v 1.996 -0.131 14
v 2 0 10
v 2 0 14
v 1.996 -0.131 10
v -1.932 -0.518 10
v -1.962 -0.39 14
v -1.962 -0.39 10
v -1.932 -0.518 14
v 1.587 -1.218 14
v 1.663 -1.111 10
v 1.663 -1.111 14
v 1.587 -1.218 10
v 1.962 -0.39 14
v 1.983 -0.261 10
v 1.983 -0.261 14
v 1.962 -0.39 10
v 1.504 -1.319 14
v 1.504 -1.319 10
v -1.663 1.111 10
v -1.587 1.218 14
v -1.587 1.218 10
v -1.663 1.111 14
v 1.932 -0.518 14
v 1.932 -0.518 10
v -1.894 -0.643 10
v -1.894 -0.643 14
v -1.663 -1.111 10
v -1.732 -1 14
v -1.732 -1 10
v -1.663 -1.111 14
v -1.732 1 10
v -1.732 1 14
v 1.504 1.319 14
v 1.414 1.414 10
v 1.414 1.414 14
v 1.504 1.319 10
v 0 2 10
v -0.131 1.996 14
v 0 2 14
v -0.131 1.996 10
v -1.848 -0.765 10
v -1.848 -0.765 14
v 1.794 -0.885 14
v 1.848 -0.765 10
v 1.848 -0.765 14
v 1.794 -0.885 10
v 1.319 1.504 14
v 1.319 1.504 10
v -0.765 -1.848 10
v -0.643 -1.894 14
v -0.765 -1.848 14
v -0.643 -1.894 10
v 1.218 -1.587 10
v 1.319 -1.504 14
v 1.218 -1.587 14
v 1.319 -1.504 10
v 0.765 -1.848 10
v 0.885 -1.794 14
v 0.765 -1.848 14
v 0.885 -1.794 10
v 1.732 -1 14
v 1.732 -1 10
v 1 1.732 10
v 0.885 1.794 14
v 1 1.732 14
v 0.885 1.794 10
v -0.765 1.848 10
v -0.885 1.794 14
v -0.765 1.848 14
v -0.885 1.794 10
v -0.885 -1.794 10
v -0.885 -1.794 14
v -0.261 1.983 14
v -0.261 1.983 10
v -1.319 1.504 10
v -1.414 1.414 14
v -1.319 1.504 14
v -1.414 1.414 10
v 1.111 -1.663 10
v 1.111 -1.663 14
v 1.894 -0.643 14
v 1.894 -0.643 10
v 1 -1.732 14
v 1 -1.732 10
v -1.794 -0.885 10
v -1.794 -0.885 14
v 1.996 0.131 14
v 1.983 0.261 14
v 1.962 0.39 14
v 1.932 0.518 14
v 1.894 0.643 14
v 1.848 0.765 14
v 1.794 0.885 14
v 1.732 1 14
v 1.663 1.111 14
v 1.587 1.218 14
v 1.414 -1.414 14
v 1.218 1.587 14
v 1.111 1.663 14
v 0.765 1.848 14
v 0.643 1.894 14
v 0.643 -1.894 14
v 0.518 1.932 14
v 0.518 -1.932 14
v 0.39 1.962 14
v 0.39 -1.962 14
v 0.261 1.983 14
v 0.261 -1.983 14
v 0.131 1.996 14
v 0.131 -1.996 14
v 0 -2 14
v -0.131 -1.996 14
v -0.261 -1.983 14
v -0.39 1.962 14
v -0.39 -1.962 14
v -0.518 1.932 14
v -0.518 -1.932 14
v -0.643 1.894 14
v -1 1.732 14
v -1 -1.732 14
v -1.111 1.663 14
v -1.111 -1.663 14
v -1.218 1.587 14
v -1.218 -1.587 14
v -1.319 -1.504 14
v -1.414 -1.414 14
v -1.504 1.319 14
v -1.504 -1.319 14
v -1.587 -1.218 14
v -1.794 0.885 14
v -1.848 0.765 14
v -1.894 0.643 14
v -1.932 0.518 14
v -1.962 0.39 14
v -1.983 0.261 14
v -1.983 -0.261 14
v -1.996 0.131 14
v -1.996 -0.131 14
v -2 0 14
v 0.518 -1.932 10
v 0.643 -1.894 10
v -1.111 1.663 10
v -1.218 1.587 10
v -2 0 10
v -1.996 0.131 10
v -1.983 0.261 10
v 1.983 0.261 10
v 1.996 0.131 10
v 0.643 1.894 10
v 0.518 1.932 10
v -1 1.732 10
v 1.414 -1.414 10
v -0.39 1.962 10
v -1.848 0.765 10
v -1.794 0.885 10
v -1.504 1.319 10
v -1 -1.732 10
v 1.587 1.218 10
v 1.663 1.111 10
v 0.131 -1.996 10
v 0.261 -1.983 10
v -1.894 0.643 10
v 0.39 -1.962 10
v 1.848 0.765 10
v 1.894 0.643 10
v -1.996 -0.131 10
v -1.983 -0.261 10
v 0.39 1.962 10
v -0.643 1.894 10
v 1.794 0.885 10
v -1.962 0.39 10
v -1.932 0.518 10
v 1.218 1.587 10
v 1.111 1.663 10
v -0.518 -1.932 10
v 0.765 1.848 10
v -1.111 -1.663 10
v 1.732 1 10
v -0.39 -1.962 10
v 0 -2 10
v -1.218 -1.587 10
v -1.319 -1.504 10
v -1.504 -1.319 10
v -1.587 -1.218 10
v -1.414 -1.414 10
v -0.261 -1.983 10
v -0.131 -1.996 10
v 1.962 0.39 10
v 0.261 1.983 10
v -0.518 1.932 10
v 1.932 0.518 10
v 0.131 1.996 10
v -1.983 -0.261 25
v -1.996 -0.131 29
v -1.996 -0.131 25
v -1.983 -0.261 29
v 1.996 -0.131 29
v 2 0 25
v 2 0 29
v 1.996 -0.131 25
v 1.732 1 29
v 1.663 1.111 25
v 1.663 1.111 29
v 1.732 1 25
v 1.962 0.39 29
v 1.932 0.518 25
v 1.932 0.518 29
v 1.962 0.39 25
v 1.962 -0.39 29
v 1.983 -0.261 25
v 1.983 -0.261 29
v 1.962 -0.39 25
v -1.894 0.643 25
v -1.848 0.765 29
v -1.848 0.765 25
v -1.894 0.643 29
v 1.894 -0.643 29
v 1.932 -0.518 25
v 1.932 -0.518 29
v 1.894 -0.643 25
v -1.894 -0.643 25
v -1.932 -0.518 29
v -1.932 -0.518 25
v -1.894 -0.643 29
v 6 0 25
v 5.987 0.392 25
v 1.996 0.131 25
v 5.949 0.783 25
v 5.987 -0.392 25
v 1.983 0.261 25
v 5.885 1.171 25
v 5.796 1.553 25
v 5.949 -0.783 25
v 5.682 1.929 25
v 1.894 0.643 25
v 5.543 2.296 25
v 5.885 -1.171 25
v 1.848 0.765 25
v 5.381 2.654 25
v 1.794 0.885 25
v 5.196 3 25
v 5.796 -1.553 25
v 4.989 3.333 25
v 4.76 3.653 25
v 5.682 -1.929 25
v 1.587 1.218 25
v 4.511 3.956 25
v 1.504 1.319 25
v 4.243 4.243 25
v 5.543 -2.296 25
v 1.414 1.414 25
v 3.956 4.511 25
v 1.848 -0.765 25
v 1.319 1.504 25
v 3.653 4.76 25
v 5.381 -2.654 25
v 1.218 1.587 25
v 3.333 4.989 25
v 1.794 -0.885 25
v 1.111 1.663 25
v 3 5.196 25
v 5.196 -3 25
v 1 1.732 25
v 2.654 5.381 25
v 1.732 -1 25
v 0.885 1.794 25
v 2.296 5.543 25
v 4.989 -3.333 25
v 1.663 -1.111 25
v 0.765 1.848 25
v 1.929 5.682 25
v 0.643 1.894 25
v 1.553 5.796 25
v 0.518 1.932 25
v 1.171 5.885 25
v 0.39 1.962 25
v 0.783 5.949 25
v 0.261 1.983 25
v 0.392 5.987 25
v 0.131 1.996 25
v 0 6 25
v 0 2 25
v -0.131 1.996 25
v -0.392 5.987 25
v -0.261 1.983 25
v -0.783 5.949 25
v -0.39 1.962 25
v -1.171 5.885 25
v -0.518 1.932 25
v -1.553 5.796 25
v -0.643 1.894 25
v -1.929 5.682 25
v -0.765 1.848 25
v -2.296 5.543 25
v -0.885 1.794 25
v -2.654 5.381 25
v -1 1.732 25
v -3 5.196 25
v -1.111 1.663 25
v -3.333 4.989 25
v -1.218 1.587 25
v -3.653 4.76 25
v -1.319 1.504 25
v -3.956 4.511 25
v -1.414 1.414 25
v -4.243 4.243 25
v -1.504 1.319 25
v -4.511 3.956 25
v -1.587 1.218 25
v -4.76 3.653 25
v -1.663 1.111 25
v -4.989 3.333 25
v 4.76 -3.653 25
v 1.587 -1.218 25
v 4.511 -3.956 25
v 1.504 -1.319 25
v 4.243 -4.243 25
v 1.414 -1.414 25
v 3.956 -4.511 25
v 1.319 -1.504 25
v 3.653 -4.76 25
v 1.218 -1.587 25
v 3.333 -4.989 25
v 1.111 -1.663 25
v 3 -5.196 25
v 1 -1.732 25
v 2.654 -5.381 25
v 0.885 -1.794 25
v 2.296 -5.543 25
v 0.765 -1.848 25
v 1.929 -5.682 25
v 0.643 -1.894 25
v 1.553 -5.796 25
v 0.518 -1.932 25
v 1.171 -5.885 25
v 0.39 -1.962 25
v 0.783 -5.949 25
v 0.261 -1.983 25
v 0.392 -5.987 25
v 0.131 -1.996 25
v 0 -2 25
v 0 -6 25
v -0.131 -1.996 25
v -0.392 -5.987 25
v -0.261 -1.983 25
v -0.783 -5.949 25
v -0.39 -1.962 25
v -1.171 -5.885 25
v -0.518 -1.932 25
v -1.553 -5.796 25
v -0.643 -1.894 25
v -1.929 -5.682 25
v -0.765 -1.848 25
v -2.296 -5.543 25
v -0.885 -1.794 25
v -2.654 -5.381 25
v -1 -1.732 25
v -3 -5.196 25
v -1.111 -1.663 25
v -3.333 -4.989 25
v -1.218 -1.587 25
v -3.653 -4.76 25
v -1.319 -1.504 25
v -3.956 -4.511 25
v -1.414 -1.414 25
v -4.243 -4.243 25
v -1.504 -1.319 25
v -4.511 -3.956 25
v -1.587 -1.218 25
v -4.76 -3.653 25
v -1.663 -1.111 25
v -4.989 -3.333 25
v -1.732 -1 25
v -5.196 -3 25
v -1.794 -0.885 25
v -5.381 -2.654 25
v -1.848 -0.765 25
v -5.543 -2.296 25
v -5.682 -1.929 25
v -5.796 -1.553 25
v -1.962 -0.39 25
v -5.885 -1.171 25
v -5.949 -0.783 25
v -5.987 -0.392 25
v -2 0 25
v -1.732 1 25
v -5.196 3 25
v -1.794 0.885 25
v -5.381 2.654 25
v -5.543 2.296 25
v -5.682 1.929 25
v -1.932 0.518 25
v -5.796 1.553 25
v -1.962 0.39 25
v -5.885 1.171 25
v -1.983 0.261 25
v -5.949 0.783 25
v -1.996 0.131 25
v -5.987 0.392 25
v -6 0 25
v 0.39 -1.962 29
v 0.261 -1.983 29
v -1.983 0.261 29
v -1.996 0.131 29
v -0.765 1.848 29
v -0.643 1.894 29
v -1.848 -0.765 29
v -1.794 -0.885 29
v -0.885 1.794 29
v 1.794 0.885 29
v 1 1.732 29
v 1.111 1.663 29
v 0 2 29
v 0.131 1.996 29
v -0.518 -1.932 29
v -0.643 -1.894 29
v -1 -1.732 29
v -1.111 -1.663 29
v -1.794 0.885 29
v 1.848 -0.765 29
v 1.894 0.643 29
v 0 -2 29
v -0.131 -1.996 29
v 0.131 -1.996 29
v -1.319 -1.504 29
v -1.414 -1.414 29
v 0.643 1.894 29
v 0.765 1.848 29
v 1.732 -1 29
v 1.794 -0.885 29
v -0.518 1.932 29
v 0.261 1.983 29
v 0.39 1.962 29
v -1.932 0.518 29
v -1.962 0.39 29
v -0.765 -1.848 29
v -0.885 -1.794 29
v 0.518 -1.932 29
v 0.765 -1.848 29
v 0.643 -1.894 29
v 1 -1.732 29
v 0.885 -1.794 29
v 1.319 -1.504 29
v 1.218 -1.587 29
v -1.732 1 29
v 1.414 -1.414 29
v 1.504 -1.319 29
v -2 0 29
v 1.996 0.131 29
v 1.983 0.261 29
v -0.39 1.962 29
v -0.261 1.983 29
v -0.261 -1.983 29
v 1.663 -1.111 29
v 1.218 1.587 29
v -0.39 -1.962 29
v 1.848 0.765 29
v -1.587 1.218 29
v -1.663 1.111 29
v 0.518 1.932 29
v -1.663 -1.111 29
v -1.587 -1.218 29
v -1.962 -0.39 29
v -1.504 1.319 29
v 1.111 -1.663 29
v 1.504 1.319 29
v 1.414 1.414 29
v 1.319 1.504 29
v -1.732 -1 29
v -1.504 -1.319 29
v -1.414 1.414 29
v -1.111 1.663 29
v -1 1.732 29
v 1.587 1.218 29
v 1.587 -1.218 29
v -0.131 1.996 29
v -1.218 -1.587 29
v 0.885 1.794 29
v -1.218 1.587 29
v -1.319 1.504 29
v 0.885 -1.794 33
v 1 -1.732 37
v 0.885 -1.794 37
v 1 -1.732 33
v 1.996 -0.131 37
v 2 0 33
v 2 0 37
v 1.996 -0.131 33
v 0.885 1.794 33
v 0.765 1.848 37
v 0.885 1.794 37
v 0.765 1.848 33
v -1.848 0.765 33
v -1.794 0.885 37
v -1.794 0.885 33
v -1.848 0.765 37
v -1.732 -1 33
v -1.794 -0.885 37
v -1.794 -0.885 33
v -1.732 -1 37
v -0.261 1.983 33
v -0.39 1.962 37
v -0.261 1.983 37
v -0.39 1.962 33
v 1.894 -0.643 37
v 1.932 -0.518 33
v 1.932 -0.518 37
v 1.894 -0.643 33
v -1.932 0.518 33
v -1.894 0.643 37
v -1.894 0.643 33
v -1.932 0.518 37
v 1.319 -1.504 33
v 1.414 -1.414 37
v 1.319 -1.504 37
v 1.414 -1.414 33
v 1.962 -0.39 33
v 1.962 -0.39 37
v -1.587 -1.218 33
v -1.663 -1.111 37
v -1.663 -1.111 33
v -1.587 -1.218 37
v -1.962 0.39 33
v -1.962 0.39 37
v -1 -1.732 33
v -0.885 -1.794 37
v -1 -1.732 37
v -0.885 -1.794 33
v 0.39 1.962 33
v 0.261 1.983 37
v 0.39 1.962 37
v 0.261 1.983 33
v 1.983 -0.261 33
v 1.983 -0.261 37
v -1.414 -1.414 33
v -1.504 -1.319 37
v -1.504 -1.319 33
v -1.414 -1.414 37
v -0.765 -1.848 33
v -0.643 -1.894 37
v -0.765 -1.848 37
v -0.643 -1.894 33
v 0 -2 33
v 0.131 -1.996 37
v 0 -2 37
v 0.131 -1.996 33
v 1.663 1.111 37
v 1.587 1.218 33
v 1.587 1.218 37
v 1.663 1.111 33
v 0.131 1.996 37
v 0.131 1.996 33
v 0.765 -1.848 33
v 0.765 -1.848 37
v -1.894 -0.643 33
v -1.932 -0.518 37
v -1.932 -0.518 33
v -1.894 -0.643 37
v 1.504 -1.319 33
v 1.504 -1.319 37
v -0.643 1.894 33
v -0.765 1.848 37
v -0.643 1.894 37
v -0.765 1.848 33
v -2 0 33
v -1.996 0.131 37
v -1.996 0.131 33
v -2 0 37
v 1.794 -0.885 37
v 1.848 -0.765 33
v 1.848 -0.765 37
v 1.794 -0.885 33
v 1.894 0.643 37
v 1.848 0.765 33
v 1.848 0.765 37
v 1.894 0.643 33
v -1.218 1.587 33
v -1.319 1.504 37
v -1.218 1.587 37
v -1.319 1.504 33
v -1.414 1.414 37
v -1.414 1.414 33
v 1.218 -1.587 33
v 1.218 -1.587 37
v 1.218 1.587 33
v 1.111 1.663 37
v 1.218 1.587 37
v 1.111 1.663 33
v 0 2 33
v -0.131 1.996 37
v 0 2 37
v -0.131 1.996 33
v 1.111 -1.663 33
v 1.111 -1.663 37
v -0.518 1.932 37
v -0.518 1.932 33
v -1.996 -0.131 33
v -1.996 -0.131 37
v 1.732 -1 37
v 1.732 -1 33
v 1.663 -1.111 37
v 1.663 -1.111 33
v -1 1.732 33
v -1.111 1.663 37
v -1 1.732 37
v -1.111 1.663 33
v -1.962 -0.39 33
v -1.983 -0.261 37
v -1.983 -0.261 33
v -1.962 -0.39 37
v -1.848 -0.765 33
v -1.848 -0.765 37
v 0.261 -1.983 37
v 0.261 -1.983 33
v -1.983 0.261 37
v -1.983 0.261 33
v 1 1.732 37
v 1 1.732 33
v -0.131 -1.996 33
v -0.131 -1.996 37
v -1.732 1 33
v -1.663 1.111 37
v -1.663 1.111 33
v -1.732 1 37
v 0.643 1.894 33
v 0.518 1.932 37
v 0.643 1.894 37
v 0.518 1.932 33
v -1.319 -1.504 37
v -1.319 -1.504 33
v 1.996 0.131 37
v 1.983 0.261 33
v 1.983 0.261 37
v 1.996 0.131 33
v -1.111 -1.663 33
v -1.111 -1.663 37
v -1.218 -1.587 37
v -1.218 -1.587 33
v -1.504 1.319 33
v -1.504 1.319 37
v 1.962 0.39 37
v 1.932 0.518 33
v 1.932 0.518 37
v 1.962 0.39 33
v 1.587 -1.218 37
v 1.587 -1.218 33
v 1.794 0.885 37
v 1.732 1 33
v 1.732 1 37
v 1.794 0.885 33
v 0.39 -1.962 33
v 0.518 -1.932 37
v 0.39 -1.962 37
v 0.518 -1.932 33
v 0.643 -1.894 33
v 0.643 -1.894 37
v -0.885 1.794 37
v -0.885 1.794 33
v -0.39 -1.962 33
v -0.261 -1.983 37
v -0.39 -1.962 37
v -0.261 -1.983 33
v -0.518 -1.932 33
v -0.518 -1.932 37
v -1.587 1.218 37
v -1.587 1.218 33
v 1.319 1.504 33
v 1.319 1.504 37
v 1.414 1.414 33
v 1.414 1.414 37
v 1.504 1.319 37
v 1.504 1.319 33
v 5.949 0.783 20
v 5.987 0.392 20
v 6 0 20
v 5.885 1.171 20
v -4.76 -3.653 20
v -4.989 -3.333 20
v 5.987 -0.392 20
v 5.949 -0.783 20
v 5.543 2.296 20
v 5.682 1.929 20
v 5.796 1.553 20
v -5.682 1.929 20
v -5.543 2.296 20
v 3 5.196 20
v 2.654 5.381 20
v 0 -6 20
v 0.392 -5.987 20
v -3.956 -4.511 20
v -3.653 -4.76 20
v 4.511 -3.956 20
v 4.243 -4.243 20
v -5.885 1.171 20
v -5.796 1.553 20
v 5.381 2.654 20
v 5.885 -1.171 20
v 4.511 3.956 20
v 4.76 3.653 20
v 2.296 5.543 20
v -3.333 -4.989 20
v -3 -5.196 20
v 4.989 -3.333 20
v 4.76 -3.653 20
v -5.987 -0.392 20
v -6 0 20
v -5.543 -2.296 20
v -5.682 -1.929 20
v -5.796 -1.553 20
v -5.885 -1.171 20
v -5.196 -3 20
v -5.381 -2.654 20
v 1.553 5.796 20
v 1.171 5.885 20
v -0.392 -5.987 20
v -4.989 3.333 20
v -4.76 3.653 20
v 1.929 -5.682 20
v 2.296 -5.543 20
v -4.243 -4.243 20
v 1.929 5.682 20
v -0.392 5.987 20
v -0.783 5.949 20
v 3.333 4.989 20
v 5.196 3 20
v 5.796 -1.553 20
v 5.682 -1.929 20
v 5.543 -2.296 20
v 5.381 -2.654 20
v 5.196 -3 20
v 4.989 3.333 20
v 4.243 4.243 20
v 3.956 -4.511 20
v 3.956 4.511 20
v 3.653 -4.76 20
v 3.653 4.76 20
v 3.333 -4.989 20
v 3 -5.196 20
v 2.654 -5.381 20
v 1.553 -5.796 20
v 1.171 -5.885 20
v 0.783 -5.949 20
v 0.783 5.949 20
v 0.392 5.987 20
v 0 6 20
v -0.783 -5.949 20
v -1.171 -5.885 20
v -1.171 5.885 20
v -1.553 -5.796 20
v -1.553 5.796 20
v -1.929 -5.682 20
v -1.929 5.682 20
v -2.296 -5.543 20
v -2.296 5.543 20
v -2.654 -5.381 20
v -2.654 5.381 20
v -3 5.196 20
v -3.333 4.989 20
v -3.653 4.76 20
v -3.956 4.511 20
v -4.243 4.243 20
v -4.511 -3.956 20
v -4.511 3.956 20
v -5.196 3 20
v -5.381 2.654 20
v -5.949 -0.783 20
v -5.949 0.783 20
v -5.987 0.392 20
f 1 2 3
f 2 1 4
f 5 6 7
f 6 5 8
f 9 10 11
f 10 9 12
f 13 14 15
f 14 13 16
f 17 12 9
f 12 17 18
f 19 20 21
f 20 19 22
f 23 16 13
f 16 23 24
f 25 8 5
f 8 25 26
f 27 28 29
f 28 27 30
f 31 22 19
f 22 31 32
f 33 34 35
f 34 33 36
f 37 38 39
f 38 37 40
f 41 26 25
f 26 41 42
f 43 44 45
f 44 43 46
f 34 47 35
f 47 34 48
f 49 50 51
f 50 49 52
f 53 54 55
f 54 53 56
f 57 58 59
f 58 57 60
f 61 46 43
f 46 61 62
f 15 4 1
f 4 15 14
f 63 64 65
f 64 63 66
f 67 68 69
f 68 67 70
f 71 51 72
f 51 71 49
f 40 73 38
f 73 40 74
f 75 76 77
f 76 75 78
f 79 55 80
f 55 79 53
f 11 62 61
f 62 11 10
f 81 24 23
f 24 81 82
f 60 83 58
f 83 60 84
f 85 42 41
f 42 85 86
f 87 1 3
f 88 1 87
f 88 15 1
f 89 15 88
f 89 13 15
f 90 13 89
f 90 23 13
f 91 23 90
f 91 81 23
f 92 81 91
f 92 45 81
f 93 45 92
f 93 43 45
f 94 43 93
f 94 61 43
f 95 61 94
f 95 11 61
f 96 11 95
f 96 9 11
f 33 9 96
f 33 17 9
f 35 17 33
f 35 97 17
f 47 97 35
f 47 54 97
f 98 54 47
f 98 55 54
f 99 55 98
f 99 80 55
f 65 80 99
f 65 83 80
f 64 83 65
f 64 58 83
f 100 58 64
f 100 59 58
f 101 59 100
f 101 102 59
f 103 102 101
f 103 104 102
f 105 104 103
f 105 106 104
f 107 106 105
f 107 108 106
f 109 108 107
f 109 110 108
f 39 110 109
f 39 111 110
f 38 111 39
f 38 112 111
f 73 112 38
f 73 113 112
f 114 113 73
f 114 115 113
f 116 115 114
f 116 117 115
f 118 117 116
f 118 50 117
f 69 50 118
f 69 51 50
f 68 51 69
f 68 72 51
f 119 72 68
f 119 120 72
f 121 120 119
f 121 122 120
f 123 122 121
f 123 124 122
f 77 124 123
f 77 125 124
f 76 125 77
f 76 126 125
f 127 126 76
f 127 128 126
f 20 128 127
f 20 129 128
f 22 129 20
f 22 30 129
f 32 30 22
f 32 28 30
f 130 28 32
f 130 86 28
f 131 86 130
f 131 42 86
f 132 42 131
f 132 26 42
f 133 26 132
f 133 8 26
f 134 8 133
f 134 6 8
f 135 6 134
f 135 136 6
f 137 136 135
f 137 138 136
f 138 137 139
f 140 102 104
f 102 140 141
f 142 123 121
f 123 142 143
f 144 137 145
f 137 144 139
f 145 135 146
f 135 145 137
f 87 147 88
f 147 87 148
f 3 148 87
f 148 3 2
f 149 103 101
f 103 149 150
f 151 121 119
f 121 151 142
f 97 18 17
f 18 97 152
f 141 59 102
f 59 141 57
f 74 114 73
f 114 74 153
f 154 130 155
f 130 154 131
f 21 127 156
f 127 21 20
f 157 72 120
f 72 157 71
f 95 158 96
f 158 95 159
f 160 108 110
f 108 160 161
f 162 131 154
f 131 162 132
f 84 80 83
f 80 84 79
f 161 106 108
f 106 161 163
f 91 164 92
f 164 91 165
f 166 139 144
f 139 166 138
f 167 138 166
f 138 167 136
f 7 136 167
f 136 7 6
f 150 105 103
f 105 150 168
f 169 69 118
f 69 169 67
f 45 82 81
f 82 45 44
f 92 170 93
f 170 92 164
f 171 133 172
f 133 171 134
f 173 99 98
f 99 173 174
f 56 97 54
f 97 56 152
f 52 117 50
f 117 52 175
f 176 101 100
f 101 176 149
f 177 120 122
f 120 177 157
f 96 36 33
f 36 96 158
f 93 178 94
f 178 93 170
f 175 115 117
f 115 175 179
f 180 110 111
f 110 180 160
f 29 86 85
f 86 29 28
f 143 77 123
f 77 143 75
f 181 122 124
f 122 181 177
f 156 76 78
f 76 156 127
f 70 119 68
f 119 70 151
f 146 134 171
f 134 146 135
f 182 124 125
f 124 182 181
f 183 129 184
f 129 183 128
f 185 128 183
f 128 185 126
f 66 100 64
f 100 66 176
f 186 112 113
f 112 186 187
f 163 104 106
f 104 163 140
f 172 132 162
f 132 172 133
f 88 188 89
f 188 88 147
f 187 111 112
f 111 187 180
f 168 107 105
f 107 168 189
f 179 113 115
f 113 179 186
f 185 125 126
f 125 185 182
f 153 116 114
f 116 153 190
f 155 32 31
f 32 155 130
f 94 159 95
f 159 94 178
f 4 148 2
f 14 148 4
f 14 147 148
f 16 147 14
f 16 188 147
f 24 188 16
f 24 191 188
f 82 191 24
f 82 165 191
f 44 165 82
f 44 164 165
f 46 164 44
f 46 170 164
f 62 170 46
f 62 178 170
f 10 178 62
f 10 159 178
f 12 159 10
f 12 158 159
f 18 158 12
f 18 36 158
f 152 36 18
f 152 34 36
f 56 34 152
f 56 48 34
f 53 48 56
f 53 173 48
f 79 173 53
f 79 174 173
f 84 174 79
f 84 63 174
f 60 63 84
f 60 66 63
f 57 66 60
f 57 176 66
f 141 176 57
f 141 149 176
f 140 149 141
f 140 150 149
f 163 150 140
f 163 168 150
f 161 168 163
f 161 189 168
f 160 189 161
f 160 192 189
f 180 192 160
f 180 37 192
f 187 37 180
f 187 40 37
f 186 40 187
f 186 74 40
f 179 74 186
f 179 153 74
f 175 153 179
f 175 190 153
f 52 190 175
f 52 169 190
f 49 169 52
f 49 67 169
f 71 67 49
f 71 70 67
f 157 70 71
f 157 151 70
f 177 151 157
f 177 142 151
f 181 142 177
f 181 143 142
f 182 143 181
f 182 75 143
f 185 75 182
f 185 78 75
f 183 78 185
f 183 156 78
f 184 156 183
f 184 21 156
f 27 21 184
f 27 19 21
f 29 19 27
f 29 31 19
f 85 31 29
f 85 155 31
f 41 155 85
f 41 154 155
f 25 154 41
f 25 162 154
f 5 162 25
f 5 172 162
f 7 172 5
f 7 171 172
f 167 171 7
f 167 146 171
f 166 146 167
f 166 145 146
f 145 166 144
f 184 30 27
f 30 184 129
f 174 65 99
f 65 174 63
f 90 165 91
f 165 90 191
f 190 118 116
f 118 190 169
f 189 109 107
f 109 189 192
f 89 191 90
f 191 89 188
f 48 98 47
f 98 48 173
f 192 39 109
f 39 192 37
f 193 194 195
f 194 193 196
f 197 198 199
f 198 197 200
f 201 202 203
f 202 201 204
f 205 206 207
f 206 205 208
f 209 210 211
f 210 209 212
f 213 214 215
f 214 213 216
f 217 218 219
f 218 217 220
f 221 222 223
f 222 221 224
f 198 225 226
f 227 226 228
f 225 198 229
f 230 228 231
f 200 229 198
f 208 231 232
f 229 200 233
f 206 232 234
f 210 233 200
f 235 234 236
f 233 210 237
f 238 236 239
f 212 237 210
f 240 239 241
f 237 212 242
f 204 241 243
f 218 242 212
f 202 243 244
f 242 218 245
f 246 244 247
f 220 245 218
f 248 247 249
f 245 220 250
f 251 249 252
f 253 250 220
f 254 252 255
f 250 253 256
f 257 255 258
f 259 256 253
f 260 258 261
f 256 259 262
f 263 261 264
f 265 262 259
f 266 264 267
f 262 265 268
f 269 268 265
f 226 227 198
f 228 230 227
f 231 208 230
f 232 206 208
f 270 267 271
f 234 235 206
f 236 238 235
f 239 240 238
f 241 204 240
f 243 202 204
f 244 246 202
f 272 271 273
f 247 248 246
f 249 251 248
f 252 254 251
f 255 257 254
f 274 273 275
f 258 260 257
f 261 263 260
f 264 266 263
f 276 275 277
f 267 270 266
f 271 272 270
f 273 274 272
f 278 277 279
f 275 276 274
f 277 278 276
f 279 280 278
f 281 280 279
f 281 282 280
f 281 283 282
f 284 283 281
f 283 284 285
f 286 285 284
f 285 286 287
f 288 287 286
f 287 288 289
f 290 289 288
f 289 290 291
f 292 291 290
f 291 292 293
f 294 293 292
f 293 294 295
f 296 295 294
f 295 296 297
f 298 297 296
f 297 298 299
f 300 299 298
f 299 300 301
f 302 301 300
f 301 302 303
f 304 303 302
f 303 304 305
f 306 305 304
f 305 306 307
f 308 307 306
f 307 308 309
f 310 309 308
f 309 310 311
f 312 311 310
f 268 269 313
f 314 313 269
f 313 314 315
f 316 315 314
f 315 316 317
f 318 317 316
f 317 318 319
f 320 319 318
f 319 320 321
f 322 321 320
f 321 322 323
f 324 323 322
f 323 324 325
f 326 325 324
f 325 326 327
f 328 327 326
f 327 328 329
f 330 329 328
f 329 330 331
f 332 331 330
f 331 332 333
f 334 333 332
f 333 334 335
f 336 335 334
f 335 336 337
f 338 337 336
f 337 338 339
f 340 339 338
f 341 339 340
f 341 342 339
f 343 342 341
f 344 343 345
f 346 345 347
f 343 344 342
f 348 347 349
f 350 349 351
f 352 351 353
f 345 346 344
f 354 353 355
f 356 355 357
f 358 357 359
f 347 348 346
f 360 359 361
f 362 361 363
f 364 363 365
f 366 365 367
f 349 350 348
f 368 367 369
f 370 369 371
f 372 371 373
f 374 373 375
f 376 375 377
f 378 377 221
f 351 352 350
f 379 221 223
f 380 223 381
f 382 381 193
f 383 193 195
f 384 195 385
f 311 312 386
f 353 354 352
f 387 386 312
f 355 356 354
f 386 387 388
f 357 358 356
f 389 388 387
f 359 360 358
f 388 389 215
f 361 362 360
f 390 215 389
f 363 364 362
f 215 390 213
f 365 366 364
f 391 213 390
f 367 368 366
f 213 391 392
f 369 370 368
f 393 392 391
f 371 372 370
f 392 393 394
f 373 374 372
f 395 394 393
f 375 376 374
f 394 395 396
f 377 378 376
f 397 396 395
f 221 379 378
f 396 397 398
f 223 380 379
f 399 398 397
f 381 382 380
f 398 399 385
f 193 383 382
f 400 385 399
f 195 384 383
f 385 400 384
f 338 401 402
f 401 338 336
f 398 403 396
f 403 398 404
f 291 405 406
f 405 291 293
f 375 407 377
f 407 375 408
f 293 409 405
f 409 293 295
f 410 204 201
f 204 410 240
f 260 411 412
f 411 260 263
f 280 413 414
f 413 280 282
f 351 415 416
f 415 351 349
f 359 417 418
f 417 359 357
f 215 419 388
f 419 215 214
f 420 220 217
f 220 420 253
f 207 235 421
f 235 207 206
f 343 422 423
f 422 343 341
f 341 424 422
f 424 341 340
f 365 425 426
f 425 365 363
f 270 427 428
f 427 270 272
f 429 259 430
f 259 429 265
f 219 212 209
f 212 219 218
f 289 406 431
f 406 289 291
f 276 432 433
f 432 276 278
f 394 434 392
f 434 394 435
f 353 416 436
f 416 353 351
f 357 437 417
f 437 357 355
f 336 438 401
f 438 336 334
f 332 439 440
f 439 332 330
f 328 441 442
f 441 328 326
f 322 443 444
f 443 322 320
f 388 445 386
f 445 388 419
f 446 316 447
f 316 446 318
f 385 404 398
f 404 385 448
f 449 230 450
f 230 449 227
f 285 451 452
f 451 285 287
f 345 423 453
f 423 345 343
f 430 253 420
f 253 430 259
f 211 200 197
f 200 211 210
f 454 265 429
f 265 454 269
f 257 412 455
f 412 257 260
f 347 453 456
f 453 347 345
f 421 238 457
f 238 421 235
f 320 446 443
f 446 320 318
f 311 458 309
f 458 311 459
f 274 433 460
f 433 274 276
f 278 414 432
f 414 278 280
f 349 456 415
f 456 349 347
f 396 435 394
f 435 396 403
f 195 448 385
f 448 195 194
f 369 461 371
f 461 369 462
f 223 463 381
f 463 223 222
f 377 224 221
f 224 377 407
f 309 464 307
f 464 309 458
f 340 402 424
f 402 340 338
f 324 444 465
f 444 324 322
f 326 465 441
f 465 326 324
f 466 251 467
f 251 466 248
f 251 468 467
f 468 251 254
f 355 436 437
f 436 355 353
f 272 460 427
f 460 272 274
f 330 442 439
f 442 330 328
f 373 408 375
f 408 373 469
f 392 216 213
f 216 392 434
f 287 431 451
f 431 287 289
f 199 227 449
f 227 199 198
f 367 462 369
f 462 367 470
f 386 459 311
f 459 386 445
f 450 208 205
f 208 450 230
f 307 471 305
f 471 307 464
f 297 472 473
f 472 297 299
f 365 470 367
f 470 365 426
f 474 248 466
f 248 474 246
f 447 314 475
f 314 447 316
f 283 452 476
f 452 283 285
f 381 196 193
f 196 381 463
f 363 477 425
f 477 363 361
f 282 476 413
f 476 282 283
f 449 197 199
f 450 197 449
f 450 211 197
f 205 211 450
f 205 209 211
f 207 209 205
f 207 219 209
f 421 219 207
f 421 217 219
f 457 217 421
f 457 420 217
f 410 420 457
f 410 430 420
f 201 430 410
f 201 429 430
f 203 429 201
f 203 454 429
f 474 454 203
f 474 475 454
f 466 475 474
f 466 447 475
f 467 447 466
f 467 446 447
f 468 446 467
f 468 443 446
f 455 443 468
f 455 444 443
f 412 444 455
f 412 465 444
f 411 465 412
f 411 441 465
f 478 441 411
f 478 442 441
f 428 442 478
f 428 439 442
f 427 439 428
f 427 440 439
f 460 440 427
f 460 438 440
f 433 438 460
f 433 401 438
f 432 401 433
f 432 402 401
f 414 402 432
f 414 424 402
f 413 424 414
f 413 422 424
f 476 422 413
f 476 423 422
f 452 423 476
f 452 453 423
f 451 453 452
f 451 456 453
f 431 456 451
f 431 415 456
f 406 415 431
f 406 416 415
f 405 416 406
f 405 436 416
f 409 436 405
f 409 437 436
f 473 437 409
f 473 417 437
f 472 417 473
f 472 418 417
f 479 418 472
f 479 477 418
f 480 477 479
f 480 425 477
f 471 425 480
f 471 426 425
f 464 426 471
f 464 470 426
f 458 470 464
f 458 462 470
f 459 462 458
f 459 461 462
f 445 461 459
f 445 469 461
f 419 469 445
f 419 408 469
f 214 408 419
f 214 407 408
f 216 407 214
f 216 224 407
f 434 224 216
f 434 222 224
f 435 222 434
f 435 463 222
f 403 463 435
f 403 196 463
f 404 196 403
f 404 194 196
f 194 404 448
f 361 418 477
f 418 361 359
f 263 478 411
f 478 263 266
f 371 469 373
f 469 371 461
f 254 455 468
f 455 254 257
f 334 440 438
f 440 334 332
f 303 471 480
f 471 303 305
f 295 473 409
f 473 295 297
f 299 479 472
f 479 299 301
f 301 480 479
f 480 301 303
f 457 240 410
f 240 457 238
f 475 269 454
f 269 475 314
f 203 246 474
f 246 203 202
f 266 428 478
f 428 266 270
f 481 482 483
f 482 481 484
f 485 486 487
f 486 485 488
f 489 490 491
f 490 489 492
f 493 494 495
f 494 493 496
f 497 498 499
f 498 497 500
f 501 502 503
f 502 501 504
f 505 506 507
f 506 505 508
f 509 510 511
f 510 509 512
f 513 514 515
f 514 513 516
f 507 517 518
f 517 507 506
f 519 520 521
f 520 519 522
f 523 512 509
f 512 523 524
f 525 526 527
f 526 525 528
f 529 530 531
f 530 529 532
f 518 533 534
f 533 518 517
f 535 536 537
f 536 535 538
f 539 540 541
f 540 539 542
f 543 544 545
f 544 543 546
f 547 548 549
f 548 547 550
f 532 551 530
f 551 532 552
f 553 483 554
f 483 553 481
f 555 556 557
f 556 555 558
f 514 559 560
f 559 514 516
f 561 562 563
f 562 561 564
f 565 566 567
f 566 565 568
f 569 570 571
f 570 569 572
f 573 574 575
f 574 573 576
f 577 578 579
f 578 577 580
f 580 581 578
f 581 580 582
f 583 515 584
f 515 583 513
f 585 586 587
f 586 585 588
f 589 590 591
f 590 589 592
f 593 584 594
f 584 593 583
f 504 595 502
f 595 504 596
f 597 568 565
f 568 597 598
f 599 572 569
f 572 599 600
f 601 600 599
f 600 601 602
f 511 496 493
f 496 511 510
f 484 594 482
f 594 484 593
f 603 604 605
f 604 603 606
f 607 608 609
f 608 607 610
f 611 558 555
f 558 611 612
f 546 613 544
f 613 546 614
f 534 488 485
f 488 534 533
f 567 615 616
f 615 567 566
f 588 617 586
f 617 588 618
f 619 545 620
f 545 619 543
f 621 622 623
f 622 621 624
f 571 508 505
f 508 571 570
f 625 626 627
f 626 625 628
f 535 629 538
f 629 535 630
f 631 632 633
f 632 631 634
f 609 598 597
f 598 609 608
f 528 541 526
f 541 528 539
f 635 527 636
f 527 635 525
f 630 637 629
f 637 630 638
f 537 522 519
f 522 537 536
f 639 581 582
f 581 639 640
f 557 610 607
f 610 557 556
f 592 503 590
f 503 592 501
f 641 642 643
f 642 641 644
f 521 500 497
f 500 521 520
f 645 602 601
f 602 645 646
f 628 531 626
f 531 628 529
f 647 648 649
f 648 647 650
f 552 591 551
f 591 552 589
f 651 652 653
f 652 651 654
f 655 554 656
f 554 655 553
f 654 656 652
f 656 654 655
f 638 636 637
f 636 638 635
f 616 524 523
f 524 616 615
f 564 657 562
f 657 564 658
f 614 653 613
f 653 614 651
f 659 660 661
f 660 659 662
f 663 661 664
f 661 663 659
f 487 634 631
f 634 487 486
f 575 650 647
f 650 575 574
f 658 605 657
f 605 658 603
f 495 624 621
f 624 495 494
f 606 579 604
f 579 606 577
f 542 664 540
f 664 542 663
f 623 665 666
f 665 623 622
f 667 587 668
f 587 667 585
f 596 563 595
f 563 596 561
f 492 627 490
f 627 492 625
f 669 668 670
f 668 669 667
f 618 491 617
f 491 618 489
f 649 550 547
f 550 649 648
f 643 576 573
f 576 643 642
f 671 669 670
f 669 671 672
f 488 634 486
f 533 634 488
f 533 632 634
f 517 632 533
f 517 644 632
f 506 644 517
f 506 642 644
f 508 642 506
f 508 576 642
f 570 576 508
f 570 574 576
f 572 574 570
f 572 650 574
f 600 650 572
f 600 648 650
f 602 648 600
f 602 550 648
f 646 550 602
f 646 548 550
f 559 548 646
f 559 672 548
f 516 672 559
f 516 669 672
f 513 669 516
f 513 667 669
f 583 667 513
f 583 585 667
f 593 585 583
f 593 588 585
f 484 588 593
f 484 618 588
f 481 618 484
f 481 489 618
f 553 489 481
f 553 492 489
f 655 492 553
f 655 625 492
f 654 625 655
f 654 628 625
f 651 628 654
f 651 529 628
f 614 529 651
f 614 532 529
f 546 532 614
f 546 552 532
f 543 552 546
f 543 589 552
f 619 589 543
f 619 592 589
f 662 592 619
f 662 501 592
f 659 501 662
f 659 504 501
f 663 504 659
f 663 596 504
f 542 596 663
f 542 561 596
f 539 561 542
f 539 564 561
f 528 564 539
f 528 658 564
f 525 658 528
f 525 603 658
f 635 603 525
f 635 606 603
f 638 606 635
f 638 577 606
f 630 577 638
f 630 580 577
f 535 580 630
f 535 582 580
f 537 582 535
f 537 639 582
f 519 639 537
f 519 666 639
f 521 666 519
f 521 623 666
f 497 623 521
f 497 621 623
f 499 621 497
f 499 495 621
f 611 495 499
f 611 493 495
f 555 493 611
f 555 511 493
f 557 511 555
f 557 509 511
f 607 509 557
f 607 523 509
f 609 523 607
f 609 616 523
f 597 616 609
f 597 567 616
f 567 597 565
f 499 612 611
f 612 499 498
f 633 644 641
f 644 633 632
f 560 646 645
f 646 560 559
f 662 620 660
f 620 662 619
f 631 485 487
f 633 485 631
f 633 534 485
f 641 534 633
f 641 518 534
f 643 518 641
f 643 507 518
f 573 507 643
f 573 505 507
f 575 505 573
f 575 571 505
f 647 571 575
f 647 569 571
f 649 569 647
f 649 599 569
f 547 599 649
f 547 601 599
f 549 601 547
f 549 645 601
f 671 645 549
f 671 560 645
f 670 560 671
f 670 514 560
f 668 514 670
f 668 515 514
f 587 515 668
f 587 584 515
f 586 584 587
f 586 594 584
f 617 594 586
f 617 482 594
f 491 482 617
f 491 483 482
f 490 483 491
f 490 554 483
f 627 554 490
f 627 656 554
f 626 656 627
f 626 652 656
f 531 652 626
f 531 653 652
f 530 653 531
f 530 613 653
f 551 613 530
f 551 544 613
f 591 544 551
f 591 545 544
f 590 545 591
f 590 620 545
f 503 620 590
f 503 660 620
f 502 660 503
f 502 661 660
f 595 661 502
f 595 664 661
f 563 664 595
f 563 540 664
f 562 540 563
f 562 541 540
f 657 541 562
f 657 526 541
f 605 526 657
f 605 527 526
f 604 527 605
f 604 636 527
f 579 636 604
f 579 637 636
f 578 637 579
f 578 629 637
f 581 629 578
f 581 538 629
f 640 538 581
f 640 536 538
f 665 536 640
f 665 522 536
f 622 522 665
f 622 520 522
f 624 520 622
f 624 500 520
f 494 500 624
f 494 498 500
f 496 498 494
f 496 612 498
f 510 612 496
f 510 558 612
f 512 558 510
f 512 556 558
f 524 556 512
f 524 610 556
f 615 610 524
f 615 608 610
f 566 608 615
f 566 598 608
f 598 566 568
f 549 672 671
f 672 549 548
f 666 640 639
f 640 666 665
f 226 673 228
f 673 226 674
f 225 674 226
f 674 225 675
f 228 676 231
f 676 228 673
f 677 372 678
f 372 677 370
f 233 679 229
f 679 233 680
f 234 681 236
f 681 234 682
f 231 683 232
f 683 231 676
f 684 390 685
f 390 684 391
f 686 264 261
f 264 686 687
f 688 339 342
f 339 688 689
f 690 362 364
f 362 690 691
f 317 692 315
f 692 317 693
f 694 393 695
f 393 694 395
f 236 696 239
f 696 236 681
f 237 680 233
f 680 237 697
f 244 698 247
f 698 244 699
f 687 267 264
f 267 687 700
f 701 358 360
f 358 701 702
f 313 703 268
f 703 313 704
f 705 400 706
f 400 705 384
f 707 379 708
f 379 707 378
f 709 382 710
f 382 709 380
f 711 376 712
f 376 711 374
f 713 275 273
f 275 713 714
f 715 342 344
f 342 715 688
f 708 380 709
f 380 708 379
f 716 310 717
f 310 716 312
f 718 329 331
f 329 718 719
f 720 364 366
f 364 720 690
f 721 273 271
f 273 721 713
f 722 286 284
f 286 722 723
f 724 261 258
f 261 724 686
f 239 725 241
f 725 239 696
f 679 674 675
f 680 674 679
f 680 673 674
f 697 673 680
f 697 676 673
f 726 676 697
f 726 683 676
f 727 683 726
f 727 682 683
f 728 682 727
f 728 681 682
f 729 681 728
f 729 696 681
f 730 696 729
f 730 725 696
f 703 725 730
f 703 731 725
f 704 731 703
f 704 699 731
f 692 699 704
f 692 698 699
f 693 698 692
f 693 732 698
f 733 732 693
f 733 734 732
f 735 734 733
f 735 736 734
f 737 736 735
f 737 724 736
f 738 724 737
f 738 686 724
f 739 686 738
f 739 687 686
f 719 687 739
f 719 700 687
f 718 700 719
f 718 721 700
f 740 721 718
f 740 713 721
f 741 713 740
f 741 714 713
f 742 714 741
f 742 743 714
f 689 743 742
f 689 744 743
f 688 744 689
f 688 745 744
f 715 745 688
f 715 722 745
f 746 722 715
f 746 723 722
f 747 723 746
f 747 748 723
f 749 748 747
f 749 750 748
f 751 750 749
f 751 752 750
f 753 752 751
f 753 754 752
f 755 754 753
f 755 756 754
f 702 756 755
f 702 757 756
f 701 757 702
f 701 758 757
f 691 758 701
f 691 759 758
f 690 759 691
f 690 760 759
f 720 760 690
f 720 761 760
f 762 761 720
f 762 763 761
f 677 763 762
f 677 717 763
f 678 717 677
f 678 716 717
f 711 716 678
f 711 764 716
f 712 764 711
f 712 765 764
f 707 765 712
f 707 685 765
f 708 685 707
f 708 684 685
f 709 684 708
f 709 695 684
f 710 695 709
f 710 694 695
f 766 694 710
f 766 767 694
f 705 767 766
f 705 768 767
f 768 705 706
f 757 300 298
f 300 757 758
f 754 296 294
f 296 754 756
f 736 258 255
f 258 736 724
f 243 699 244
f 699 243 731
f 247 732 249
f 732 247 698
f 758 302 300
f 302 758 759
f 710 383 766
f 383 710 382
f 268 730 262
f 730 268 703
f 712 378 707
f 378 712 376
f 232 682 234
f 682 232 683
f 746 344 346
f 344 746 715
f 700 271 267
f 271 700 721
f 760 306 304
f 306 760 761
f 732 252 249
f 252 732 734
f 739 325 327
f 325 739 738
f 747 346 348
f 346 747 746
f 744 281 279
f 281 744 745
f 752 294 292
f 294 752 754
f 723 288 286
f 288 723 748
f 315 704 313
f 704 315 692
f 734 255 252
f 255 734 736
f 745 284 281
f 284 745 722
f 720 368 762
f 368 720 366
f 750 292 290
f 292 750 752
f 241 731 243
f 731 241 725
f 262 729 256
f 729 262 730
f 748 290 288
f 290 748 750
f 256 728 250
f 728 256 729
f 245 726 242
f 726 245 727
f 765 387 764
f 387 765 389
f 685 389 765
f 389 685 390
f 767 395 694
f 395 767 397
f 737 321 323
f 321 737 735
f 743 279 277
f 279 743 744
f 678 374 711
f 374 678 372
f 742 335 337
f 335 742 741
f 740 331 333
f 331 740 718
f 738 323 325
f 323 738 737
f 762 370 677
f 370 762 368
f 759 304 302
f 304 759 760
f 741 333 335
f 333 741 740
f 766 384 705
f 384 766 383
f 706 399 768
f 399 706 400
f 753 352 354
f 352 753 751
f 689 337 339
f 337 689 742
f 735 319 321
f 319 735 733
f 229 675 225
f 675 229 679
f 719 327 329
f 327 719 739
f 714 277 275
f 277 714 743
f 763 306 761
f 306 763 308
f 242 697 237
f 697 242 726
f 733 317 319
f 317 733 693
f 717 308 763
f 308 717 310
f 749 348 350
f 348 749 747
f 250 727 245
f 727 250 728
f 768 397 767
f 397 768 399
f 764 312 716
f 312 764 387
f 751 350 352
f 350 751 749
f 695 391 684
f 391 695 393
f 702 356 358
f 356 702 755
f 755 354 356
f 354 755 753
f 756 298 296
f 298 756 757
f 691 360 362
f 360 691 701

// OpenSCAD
// Hose-barb reducer: joins 8 mm ID tubing to 5 mm ID tubing
// Print orientation: standing upright along +Z, centred on origin in X/Y

$fn = 96;

// ---- Dimensions (mm) ----
eps      = 0.5;         // overcut for clean differences
barb_h8  = 10;          // height of each 8 mm barb
barb_od8_bottom = 7.5;  // outer diameter of 8 mm barb at bottom
barb_od8_top    = 9.5;  // outer diameter of 8 mm barb at top
collar_d      = 12;     // diameter of the collar
barb_h5  = 8;           // height of each 5 mm barb
barb_od5_bottom = 6.5;  // outer diameter of 5 mm barb at bottom
barb_od5_top    = 5.0;  // outer diameter of 5 mm barb at top
bore      = 3;          // central through-bore diameter
length8   = 20;         // z extent of the 8 mm tubing section
length5   = 16;         // z extent of the 5 mm tubing section (z = 25 to 41)
overlap   = 0.01;       // small overlap between stacked barbs

// ---- Model ----
union() {
    // 8 mm tubing section: two stacked barbs with sawtooth profile
    for (i = [0, 1]) {
        translate([0, 0, i * barb_h8])
            difference() {
                linear_extrude(height = bore + 2 * eps)
                    circle(d = bore + 2 * eps);
                // Barb body: OD grows linearly, then steps back to bottom OD
                hull() {
                    translate([0, 0, i * barb_h8 - overlap])
                        cylinder(d = barb_od8_bottom, h = overlap + 0.01);
                    translate([0, 0, i * barb_h8 + barb_h8 - overlap])
                        cylinder(d = barb_od8_top, h = overlap + 0.01);
                }
                // Step down from top of barb back to 7.5 mm OD
                translate([0, 0, i * barb_h8 + barb_h8 - overlap])
                    cylinder(d = barb_od8_bottom, h = overlap + 0.01);
            }
    }
    // Collar
    translate([0, 0, length8])
        cylinder(d = collar_d, h = 5);
    // 5 mm tubing section: two stacked barbs, shrinking OD
    for (i = [0, 1]) {
        translate([0, 0, length8 + 5 + i * barb_h5])
            difference() {
                linear_extrude(height = bore + 2 * eps)
                    circle(d = bore + 2 * eps);
                // Barb body: OD shrinks linearly from bottom to top
                hull() {
                    translate([0, 0, length8 + 5 + i * barb_h5 - overlap])
                        cylinder(d = barb_od5_bottom, h = overlap + 0.01);
                    translate([0, 0, length8 + 5 + i * barb_h5 + barb_h5 - overlap])
                        cylinder(d = barb_od5_top, h = overlap + 0.01);
                }
                // Step back out from top of barb to bottom OD
                translate([0, 0, length8 + 5 + i * barb_h5 + barb_h5 - overlap])
                    cylinder(d = barb_od5_bottom, h = overlap + 0.01);
            }
    }
}
